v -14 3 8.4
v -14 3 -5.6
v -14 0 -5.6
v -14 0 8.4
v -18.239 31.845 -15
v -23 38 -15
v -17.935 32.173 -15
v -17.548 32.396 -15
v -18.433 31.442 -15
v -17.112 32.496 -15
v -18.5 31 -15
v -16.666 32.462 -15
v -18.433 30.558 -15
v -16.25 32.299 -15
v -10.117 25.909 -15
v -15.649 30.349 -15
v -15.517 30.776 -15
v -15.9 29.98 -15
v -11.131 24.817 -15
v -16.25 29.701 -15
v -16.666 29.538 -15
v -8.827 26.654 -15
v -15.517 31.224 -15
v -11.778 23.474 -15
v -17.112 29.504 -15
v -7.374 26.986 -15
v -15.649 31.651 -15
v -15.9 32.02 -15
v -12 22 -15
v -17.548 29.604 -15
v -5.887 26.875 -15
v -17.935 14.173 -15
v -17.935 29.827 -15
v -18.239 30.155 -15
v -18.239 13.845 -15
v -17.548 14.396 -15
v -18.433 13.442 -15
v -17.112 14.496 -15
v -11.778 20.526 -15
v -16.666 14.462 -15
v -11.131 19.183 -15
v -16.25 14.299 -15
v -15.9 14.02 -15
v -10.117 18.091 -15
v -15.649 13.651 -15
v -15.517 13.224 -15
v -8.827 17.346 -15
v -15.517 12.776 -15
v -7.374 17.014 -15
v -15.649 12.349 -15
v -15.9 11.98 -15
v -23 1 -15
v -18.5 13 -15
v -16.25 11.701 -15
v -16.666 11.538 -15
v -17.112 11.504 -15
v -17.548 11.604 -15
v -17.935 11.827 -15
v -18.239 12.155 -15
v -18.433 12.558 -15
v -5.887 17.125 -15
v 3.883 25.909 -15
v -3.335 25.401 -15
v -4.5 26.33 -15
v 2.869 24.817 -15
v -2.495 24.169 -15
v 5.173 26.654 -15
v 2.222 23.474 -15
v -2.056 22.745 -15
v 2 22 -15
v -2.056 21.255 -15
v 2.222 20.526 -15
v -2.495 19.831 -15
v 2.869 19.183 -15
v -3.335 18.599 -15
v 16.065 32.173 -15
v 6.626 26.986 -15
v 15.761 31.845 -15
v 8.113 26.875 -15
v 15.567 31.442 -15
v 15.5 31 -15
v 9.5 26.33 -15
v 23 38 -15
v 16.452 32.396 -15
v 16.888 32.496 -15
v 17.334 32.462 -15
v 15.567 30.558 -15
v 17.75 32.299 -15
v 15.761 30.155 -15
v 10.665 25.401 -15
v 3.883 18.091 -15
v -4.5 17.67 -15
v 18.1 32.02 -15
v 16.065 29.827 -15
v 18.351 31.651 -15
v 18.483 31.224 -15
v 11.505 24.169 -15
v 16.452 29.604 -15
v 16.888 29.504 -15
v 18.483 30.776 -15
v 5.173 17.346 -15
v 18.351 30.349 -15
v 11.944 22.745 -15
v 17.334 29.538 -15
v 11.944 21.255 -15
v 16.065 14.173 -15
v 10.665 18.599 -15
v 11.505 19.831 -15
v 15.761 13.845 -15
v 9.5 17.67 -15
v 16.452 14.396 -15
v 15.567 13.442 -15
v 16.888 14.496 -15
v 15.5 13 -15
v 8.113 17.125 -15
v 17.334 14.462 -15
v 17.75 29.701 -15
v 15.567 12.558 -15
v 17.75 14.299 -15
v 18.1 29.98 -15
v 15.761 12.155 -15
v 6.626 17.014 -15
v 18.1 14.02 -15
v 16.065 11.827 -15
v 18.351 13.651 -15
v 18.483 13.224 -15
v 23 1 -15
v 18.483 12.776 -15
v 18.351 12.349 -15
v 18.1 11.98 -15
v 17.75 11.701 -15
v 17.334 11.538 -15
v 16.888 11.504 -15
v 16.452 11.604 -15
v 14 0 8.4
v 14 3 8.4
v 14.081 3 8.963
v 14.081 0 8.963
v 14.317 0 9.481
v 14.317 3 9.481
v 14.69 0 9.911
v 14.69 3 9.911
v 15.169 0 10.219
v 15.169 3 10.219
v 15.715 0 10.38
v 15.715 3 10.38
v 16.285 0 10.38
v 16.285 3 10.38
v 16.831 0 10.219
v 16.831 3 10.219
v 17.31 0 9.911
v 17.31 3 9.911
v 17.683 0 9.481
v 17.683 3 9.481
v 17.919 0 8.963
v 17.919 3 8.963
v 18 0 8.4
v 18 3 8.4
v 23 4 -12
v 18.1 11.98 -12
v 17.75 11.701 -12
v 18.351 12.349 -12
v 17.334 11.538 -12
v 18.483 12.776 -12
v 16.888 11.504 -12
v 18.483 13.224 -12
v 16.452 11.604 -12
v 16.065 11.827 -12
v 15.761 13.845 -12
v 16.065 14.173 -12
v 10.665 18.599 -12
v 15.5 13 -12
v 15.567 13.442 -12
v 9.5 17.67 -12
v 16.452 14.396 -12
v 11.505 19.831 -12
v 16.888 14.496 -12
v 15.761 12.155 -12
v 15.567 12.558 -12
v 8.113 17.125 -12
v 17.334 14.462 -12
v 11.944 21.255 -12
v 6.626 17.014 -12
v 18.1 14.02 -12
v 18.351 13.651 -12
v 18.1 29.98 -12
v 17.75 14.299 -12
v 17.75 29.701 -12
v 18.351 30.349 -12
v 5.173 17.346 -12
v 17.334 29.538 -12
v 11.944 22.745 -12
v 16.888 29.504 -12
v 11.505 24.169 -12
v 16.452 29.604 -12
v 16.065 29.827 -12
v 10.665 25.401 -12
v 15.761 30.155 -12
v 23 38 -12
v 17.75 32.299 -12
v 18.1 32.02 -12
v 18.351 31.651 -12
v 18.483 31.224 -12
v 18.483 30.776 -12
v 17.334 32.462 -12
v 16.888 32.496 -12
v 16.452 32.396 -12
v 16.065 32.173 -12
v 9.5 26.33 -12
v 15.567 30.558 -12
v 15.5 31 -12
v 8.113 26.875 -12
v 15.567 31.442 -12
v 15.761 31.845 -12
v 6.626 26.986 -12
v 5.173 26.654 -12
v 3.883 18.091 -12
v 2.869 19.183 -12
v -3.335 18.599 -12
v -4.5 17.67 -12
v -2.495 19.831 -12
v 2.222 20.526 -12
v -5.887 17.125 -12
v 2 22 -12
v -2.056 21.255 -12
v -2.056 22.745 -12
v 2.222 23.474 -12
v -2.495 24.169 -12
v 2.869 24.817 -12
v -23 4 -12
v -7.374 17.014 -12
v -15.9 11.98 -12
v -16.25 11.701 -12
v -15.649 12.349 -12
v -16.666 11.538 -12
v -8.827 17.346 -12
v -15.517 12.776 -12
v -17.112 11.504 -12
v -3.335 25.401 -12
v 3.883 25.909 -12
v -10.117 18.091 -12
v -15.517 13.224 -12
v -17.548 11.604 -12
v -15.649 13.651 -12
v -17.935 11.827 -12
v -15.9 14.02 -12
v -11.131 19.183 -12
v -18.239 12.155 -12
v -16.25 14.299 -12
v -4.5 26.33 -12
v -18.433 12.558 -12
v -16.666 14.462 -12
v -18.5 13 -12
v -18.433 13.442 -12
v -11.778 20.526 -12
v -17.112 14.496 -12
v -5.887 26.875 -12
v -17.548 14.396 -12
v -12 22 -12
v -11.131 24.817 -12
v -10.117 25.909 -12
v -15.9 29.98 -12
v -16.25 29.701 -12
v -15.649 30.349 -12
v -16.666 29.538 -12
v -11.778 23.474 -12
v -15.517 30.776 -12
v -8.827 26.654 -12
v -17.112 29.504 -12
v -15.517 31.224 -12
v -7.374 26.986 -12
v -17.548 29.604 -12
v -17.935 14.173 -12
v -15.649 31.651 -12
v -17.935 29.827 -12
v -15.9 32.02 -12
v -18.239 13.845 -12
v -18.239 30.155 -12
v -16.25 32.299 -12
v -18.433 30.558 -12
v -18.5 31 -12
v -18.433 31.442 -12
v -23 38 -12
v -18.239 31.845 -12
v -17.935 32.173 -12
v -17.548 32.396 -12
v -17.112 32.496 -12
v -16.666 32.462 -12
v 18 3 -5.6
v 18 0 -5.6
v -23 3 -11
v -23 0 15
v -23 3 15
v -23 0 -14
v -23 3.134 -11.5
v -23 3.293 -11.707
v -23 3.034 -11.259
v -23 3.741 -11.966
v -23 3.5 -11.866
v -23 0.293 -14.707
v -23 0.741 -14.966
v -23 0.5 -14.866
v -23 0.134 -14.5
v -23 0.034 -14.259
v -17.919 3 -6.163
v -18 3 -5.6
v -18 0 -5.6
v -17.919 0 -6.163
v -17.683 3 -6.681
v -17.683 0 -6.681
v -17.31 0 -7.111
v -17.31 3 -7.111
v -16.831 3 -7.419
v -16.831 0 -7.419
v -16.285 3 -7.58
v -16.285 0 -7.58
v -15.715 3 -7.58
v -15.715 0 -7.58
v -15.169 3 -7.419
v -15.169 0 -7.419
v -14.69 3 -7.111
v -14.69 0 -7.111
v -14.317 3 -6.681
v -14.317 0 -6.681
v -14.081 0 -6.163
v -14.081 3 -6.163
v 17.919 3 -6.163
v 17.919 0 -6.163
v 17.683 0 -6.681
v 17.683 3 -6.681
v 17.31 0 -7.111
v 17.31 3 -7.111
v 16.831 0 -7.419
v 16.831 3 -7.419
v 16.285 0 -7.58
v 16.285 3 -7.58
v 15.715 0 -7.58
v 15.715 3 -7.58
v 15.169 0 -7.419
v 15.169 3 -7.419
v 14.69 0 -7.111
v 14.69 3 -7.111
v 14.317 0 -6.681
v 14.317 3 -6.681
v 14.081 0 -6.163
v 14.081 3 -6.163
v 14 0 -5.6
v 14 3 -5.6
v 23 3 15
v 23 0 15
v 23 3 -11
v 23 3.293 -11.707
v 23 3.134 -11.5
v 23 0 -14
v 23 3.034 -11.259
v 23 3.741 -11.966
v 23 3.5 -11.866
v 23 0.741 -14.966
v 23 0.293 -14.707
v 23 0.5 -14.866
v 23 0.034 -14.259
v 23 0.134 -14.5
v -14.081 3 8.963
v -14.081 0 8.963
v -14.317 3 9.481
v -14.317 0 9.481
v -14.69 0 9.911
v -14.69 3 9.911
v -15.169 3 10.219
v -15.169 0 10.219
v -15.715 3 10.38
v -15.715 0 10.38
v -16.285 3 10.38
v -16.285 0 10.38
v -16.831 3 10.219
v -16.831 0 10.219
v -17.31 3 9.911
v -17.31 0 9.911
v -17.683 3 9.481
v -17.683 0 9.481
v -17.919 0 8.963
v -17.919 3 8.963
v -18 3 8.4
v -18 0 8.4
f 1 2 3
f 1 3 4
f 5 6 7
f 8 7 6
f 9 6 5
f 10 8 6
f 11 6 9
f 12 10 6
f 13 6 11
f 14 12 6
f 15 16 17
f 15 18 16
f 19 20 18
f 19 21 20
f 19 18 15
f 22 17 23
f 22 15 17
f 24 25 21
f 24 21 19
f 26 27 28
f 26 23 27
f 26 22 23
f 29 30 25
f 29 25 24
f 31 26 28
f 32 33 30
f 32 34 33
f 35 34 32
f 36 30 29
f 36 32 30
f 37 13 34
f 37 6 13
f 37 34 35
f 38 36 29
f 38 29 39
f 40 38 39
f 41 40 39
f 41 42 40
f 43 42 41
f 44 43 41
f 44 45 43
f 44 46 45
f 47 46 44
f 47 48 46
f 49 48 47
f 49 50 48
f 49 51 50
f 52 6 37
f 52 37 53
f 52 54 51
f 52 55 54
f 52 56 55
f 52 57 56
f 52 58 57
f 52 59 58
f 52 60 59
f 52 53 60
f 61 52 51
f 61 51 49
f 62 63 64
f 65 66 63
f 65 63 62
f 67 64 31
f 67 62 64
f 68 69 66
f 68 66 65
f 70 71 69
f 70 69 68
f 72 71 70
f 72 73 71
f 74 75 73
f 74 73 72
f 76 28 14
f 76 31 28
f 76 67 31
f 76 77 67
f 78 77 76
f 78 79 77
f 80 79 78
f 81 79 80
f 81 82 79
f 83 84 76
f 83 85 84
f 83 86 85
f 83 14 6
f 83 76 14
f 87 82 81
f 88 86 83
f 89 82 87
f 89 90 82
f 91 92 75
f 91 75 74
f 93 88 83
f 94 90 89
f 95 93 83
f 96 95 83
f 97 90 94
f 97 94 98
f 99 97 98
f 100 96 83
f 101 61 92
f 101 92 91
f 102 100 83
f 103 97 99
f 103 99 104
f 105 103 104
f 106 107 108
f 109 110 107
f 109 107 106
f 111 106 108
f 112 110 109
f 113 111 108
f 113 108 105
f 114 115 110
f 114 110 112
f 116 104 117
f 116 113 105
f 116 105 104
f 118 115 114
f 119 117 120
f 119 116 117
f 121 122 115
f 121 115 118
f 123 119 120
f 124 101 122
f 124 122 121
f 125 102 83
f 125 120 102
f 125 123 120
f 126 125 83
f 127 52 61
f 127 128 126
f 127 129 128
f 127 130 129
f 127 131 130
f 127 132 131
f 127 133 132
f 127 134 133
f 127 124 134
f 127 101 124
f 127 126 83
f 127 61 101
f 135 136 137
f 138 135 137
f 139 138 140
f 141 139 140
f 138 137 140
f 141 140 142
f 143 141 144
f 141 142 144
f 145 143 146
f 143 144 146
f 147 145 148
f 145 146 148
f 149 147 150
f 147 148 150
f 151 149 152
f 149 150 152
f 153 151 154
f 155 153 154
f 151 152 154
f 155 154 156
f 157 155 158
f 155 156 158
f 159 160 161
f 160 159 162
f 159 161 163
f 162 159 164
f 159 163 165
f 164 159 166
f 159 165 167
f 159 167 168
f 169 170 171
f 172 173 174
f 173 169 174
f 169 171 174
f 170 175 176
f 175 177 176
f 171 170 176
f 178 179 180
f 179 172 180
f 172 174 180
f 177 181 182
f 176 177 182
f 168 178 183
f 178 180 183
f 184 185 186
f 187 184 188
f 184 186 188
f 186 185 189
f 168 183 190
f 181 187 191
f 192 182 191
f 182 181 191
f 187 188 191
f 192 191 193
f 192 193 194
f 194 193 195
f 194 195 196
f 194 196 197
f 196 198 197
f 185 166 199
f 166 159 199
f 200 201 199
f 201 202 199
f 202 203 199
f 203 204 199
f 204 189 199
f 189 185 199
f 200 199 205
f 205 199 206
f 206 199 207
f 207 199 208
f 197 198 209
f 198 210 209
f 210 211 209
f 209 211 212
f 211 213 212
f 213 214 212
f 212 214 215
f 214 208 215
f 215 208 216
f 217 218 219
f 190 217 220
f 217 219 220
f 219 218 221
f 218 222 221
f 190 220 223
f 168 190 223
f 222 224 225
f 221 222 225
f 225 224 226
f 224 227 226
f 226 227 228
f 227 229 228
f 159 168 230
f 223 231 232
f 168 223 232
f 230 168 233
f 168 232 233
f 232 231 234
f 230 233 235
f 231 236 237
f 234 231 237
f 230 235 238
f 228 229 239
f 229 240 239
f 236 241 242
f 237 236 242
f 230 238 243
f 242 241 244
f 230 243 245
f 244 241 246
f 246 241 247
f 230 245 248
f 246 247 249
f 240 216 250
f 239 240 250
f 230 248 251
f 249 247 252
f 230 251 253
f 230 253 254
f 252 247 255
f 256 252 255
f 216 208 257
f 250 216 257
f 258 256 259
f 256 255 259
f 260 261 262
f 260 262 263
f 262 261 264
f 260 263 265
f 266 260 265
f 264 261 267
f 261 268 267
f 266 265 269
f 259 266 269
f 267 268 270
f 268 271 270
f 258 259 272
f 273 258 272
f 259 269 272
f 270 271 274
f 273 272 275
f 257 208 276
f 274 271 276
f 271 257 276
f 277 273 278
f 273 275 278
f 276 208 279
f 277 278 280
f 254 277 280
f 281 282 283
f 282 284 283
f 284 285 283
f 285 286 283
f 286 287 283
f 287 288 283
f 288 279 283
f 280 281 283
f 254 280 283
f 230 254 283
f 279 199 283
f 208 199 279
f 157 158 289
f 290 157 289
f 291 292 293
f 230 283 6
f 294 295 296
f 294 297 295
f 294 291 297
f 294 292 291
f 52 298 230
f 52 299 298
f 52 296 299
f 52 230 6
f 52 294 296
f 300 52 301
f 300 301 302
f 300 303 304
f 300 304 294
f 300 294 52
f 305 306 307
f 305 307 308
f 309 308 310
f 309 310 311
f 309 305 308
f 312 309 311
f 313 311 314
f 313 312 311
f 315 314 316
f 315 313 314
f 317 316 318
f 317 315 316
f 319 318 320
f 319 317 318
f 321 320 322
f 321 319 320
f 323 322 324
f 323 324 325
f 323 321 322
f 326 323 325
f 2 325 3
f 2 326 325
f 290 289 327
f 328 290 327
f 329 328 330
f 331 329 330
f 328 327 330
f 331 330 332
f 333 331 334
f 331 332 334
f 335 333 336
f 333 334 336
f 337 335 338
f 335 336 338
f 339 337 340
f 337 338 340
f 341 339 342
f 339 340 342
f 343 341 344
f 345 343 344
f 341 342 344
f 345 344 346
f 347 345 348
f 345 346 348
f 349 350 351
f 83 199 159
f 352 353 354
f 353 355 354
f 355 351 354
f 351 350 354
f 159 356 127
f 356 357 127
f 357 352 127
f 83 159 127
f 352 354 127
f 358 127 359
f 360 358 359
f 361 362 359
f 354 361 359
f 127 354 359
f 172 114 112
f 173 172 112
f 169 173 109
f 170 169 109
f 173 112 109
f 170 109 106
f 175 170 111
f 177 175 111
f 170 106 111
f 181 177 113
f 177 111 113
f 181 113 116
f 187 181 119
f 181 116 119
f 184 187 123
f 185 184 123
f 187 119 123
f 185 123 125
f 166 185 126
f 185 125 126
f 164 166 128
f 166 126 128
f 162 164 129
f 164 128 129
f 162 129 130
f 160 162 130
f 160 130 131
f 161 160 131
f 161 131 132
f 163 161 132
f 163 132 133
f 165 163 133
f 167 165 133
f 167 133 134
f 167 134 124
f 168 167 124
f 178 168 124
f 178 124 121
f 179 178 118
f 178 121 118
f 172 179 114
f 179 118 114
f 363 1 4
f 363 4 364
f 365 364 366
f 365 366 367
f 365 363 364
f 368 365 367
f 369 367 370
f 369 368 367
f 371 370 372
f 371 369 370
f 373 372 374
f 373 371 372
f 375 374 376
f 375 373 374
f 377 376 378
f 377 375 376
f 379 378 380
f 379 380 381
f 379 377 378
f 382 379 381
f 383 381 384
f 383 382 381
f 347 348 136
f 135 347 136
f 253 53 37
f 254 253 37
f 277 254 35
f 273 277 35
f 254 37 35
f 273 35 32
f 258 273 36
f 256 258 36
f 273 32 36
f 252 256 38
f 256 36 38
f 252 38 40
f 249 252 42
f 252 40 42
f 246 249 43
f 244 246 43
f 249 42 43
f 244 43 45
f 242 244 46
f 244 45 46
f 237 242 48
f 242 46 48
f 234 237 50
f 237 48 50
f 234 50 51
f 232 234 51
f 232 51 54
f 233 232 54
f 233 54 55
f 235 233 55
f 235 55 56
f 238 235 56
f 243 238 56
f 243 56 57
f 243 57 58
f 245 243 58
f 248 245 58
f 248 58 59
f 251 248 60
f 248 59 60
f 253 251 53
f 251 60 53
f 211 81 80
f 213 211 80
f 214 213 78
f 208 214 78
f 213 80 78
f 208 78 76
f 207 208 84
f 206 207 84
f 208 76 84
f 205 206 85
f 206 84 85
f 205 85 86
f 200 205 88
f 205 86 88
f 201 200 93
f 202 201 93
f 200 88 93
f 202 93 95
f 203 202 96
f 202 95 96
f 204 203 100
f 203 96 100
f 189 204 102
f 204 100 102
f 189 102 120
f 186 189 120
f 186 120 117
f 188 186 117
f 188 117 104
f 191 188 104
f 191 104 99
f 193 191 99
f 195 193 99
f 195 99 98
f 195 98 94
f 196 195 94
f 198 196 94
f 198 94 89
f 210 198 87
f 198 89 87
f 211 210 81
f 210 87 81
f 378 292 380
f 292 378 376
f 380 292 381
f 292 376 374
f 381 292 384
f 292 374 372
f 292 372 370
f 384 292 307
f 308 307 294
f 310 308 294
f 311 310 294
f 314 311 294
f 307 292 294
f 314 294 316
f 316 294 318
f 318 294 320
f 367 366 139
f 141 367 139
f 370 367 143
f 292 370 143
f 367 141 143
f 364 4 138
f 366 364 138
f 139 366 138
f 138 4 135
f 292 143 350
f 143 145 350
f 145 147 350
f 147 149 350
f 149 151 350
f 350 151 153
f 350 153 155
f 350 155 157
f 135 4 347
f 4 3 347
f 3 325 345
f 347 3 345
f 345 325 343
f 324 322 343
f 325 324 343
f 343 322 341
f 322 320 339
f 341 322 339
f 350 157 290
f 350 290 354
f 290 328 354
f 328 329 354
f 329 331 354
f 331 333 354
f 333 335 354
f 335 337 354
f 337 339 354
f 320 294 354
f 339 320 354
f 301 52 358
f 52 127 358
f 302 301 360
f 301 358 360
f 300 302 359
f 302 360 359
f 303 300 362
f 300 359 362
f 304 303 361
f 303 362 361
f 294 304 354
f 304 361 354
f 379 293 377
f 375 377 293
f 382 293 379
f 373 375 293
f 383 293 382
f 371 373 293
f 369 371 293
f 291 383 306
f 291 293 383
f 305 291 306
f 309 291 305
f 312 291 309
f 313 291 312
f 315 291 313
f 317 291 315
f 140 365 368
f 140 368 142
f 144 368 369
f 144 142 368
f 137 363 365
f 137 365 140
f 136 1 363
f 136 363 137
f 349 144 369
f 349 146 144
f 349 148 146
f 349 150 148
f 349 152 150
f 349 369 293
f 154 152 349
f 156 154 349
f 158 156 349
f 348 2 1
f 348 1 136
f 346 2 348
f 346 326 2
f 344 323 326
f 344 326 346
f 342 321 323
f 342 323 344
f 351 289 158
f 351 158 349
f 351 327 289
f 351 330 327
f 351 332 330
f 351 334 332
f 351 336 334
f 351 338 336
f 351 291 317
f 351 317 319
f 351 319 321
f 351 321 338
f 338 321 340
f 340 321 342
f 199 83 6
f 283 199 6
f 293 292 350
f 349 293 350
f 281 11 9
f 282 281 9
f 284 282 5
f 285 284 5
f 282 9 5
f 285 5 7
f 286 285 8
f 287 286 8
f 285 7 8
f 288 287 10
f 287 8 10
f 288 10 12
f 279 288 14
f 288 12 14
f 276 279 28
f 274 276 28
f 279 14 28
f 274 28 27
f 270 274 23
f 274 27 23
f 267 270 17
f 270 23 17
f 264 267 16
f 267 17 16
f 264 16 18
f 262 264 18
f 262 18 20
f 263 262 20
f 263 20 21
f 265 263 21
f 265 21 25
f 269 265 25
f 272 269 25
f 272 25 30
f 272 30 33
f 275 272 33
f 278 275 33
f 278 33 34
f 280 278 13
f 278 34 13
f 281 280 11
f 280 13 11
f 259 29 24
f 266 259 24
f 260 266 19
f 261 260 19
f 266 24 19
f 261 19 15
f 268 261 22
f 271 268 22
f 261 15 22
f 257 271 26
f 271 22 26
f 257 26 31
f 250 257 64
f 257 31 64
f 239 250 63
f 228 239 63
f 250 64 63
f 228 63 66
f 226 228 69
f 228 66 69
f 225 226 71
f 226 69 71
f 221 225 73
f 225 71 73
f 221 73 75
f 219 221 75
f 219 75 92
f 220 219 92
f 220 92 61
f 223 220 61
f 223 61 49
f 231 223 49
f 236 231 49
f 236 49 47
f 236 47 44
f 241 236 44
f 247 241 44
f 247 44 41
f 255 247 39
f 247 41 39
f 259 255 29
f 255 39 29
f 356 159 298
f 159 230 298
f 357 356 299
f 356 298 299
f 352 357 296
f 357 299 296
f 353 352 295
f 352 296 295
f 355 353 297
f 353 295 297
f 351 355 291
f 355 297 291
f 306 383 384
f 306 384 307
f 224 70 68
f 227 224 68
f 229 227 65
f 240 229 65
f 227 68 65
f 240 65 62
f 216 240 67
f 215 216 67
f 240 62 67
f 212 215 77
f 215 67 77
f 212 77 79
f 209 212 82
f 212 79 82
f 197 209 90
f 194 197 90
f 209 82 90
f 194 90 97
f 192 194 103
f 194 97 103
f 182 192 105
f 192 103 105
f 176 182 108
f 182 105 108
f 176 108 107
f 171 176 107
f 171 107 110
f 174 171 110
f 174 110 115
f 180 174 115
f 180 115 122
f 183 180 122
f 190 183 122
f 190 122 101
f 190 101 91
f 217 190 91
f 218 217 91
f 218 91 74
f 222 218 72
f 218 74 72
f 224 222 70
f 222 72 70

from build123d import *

# Parameters (mm, degrees)
SKETCH_1_W          = 46
SKETCH_1_H          = 30
EXTRUDE_1_DEPTH     = 3
SKETCH_2_W          = 46
SKETCH_2_H          = 38
EXTRUDE_2_DEPTH     = 3
FILLET_1_R          = 1
SKETCH_3_R          = 1.5
SKETCH_3_R_2        = 5
CUT_EXTRUDE_1_DEPTH = 3
CUT_EXTRUDE_2_DEPTH = 3


with BuildPart() as part:
    # 草图1 → 凸台-拉伸1 (new body)
    with BuildSketch(Plane(origin=(0, 0, 0), x_dir=(1, 0, 0), z_dir=(0, 1, 0))):
        Rectangle(SKETCH_1_W, SKETCH_1_H)
    extrude(amount=EXTRUDE_1_DEPTH)

    # 草图2 → 凸台-拉伸2 (add)
    with BuildSketch(Plane(origin=(0, 0, -15), x_dir=(-1, 0, 0), z_dir=(0, 0, -1))):
        with Locations((0, 19)):
            Rectangle(SKETCH_2_W, SKETCH_2_H)
    extrude(amount=-EXTRUDE_2_DEPTH)

    # 圆角1
    fillet_1_edges = [part.edges().sort_by_distance(p)[0] for p in [
        (0, 3, -12),
        (0, 0, -15),
    ]]
    fillet(fillet_1_edges, radius=FILLET_1_R)

    # 草图3 → 切除-拉伸1 (cut)
    with BuildSketch(Plane(origin=(0, 0, -15), x_dir=(-1, 0, 0), z_dir=(0, 0, -1))):
        with Locations((17, 13)):
            Circle(SKETCH_3_R)
        with Locations((17, 31)):
            Circle(SKETCH_3_R)
        with Locations((-17, 31)):
            Circle(SKETCH_3_R)
        with Locations((-17, 13)):
            Circle(SKETCH_3_R)
        with Locations((7, 22)):
            Circle(SKETCH_3_R_2)
        with Locations((-7, 22)):
            Circle(SKETCH_3_R_2)
    extrude(amount=-CUT_EXTRUDE_1_DEPTH, mode=Mode.SUBTRACT)

    # 草图4 → 切除-拉伸2 (cut)
    with BuildSketch(Plane(origin=(0, 3, 0), x_dir=(1, 0, 0), z_dir=(0, 1, 0))):
        with BuildLine():
            Line((-18, -8.4), (-18, 5.6))
            ThreePointArc((-18, 5.6), (-16, 7.6), (-14, 5.6))
            Line((-14, 5.6), (-14, -8.4))
            ThreePointArc((-14, -8.4), (-16, -10.4), (-18, -8.4))
        make_face()
        with BuildLine():
            Line((18, -8.4), (18, 5.6))
            ThreePointArc((18, 5.6), (16, 7.6), (14, 5.6))
            Line((14, 5.6), (14, -8.4))
            ThreePointArc((14, -8.4), (16, -10.4), (18, -8.4))
        make_face()
    extrude(amount=-CUT_EXTRUDE_2_DEPTH, mode=Mode.SUBTRACT)


solid = part.part
